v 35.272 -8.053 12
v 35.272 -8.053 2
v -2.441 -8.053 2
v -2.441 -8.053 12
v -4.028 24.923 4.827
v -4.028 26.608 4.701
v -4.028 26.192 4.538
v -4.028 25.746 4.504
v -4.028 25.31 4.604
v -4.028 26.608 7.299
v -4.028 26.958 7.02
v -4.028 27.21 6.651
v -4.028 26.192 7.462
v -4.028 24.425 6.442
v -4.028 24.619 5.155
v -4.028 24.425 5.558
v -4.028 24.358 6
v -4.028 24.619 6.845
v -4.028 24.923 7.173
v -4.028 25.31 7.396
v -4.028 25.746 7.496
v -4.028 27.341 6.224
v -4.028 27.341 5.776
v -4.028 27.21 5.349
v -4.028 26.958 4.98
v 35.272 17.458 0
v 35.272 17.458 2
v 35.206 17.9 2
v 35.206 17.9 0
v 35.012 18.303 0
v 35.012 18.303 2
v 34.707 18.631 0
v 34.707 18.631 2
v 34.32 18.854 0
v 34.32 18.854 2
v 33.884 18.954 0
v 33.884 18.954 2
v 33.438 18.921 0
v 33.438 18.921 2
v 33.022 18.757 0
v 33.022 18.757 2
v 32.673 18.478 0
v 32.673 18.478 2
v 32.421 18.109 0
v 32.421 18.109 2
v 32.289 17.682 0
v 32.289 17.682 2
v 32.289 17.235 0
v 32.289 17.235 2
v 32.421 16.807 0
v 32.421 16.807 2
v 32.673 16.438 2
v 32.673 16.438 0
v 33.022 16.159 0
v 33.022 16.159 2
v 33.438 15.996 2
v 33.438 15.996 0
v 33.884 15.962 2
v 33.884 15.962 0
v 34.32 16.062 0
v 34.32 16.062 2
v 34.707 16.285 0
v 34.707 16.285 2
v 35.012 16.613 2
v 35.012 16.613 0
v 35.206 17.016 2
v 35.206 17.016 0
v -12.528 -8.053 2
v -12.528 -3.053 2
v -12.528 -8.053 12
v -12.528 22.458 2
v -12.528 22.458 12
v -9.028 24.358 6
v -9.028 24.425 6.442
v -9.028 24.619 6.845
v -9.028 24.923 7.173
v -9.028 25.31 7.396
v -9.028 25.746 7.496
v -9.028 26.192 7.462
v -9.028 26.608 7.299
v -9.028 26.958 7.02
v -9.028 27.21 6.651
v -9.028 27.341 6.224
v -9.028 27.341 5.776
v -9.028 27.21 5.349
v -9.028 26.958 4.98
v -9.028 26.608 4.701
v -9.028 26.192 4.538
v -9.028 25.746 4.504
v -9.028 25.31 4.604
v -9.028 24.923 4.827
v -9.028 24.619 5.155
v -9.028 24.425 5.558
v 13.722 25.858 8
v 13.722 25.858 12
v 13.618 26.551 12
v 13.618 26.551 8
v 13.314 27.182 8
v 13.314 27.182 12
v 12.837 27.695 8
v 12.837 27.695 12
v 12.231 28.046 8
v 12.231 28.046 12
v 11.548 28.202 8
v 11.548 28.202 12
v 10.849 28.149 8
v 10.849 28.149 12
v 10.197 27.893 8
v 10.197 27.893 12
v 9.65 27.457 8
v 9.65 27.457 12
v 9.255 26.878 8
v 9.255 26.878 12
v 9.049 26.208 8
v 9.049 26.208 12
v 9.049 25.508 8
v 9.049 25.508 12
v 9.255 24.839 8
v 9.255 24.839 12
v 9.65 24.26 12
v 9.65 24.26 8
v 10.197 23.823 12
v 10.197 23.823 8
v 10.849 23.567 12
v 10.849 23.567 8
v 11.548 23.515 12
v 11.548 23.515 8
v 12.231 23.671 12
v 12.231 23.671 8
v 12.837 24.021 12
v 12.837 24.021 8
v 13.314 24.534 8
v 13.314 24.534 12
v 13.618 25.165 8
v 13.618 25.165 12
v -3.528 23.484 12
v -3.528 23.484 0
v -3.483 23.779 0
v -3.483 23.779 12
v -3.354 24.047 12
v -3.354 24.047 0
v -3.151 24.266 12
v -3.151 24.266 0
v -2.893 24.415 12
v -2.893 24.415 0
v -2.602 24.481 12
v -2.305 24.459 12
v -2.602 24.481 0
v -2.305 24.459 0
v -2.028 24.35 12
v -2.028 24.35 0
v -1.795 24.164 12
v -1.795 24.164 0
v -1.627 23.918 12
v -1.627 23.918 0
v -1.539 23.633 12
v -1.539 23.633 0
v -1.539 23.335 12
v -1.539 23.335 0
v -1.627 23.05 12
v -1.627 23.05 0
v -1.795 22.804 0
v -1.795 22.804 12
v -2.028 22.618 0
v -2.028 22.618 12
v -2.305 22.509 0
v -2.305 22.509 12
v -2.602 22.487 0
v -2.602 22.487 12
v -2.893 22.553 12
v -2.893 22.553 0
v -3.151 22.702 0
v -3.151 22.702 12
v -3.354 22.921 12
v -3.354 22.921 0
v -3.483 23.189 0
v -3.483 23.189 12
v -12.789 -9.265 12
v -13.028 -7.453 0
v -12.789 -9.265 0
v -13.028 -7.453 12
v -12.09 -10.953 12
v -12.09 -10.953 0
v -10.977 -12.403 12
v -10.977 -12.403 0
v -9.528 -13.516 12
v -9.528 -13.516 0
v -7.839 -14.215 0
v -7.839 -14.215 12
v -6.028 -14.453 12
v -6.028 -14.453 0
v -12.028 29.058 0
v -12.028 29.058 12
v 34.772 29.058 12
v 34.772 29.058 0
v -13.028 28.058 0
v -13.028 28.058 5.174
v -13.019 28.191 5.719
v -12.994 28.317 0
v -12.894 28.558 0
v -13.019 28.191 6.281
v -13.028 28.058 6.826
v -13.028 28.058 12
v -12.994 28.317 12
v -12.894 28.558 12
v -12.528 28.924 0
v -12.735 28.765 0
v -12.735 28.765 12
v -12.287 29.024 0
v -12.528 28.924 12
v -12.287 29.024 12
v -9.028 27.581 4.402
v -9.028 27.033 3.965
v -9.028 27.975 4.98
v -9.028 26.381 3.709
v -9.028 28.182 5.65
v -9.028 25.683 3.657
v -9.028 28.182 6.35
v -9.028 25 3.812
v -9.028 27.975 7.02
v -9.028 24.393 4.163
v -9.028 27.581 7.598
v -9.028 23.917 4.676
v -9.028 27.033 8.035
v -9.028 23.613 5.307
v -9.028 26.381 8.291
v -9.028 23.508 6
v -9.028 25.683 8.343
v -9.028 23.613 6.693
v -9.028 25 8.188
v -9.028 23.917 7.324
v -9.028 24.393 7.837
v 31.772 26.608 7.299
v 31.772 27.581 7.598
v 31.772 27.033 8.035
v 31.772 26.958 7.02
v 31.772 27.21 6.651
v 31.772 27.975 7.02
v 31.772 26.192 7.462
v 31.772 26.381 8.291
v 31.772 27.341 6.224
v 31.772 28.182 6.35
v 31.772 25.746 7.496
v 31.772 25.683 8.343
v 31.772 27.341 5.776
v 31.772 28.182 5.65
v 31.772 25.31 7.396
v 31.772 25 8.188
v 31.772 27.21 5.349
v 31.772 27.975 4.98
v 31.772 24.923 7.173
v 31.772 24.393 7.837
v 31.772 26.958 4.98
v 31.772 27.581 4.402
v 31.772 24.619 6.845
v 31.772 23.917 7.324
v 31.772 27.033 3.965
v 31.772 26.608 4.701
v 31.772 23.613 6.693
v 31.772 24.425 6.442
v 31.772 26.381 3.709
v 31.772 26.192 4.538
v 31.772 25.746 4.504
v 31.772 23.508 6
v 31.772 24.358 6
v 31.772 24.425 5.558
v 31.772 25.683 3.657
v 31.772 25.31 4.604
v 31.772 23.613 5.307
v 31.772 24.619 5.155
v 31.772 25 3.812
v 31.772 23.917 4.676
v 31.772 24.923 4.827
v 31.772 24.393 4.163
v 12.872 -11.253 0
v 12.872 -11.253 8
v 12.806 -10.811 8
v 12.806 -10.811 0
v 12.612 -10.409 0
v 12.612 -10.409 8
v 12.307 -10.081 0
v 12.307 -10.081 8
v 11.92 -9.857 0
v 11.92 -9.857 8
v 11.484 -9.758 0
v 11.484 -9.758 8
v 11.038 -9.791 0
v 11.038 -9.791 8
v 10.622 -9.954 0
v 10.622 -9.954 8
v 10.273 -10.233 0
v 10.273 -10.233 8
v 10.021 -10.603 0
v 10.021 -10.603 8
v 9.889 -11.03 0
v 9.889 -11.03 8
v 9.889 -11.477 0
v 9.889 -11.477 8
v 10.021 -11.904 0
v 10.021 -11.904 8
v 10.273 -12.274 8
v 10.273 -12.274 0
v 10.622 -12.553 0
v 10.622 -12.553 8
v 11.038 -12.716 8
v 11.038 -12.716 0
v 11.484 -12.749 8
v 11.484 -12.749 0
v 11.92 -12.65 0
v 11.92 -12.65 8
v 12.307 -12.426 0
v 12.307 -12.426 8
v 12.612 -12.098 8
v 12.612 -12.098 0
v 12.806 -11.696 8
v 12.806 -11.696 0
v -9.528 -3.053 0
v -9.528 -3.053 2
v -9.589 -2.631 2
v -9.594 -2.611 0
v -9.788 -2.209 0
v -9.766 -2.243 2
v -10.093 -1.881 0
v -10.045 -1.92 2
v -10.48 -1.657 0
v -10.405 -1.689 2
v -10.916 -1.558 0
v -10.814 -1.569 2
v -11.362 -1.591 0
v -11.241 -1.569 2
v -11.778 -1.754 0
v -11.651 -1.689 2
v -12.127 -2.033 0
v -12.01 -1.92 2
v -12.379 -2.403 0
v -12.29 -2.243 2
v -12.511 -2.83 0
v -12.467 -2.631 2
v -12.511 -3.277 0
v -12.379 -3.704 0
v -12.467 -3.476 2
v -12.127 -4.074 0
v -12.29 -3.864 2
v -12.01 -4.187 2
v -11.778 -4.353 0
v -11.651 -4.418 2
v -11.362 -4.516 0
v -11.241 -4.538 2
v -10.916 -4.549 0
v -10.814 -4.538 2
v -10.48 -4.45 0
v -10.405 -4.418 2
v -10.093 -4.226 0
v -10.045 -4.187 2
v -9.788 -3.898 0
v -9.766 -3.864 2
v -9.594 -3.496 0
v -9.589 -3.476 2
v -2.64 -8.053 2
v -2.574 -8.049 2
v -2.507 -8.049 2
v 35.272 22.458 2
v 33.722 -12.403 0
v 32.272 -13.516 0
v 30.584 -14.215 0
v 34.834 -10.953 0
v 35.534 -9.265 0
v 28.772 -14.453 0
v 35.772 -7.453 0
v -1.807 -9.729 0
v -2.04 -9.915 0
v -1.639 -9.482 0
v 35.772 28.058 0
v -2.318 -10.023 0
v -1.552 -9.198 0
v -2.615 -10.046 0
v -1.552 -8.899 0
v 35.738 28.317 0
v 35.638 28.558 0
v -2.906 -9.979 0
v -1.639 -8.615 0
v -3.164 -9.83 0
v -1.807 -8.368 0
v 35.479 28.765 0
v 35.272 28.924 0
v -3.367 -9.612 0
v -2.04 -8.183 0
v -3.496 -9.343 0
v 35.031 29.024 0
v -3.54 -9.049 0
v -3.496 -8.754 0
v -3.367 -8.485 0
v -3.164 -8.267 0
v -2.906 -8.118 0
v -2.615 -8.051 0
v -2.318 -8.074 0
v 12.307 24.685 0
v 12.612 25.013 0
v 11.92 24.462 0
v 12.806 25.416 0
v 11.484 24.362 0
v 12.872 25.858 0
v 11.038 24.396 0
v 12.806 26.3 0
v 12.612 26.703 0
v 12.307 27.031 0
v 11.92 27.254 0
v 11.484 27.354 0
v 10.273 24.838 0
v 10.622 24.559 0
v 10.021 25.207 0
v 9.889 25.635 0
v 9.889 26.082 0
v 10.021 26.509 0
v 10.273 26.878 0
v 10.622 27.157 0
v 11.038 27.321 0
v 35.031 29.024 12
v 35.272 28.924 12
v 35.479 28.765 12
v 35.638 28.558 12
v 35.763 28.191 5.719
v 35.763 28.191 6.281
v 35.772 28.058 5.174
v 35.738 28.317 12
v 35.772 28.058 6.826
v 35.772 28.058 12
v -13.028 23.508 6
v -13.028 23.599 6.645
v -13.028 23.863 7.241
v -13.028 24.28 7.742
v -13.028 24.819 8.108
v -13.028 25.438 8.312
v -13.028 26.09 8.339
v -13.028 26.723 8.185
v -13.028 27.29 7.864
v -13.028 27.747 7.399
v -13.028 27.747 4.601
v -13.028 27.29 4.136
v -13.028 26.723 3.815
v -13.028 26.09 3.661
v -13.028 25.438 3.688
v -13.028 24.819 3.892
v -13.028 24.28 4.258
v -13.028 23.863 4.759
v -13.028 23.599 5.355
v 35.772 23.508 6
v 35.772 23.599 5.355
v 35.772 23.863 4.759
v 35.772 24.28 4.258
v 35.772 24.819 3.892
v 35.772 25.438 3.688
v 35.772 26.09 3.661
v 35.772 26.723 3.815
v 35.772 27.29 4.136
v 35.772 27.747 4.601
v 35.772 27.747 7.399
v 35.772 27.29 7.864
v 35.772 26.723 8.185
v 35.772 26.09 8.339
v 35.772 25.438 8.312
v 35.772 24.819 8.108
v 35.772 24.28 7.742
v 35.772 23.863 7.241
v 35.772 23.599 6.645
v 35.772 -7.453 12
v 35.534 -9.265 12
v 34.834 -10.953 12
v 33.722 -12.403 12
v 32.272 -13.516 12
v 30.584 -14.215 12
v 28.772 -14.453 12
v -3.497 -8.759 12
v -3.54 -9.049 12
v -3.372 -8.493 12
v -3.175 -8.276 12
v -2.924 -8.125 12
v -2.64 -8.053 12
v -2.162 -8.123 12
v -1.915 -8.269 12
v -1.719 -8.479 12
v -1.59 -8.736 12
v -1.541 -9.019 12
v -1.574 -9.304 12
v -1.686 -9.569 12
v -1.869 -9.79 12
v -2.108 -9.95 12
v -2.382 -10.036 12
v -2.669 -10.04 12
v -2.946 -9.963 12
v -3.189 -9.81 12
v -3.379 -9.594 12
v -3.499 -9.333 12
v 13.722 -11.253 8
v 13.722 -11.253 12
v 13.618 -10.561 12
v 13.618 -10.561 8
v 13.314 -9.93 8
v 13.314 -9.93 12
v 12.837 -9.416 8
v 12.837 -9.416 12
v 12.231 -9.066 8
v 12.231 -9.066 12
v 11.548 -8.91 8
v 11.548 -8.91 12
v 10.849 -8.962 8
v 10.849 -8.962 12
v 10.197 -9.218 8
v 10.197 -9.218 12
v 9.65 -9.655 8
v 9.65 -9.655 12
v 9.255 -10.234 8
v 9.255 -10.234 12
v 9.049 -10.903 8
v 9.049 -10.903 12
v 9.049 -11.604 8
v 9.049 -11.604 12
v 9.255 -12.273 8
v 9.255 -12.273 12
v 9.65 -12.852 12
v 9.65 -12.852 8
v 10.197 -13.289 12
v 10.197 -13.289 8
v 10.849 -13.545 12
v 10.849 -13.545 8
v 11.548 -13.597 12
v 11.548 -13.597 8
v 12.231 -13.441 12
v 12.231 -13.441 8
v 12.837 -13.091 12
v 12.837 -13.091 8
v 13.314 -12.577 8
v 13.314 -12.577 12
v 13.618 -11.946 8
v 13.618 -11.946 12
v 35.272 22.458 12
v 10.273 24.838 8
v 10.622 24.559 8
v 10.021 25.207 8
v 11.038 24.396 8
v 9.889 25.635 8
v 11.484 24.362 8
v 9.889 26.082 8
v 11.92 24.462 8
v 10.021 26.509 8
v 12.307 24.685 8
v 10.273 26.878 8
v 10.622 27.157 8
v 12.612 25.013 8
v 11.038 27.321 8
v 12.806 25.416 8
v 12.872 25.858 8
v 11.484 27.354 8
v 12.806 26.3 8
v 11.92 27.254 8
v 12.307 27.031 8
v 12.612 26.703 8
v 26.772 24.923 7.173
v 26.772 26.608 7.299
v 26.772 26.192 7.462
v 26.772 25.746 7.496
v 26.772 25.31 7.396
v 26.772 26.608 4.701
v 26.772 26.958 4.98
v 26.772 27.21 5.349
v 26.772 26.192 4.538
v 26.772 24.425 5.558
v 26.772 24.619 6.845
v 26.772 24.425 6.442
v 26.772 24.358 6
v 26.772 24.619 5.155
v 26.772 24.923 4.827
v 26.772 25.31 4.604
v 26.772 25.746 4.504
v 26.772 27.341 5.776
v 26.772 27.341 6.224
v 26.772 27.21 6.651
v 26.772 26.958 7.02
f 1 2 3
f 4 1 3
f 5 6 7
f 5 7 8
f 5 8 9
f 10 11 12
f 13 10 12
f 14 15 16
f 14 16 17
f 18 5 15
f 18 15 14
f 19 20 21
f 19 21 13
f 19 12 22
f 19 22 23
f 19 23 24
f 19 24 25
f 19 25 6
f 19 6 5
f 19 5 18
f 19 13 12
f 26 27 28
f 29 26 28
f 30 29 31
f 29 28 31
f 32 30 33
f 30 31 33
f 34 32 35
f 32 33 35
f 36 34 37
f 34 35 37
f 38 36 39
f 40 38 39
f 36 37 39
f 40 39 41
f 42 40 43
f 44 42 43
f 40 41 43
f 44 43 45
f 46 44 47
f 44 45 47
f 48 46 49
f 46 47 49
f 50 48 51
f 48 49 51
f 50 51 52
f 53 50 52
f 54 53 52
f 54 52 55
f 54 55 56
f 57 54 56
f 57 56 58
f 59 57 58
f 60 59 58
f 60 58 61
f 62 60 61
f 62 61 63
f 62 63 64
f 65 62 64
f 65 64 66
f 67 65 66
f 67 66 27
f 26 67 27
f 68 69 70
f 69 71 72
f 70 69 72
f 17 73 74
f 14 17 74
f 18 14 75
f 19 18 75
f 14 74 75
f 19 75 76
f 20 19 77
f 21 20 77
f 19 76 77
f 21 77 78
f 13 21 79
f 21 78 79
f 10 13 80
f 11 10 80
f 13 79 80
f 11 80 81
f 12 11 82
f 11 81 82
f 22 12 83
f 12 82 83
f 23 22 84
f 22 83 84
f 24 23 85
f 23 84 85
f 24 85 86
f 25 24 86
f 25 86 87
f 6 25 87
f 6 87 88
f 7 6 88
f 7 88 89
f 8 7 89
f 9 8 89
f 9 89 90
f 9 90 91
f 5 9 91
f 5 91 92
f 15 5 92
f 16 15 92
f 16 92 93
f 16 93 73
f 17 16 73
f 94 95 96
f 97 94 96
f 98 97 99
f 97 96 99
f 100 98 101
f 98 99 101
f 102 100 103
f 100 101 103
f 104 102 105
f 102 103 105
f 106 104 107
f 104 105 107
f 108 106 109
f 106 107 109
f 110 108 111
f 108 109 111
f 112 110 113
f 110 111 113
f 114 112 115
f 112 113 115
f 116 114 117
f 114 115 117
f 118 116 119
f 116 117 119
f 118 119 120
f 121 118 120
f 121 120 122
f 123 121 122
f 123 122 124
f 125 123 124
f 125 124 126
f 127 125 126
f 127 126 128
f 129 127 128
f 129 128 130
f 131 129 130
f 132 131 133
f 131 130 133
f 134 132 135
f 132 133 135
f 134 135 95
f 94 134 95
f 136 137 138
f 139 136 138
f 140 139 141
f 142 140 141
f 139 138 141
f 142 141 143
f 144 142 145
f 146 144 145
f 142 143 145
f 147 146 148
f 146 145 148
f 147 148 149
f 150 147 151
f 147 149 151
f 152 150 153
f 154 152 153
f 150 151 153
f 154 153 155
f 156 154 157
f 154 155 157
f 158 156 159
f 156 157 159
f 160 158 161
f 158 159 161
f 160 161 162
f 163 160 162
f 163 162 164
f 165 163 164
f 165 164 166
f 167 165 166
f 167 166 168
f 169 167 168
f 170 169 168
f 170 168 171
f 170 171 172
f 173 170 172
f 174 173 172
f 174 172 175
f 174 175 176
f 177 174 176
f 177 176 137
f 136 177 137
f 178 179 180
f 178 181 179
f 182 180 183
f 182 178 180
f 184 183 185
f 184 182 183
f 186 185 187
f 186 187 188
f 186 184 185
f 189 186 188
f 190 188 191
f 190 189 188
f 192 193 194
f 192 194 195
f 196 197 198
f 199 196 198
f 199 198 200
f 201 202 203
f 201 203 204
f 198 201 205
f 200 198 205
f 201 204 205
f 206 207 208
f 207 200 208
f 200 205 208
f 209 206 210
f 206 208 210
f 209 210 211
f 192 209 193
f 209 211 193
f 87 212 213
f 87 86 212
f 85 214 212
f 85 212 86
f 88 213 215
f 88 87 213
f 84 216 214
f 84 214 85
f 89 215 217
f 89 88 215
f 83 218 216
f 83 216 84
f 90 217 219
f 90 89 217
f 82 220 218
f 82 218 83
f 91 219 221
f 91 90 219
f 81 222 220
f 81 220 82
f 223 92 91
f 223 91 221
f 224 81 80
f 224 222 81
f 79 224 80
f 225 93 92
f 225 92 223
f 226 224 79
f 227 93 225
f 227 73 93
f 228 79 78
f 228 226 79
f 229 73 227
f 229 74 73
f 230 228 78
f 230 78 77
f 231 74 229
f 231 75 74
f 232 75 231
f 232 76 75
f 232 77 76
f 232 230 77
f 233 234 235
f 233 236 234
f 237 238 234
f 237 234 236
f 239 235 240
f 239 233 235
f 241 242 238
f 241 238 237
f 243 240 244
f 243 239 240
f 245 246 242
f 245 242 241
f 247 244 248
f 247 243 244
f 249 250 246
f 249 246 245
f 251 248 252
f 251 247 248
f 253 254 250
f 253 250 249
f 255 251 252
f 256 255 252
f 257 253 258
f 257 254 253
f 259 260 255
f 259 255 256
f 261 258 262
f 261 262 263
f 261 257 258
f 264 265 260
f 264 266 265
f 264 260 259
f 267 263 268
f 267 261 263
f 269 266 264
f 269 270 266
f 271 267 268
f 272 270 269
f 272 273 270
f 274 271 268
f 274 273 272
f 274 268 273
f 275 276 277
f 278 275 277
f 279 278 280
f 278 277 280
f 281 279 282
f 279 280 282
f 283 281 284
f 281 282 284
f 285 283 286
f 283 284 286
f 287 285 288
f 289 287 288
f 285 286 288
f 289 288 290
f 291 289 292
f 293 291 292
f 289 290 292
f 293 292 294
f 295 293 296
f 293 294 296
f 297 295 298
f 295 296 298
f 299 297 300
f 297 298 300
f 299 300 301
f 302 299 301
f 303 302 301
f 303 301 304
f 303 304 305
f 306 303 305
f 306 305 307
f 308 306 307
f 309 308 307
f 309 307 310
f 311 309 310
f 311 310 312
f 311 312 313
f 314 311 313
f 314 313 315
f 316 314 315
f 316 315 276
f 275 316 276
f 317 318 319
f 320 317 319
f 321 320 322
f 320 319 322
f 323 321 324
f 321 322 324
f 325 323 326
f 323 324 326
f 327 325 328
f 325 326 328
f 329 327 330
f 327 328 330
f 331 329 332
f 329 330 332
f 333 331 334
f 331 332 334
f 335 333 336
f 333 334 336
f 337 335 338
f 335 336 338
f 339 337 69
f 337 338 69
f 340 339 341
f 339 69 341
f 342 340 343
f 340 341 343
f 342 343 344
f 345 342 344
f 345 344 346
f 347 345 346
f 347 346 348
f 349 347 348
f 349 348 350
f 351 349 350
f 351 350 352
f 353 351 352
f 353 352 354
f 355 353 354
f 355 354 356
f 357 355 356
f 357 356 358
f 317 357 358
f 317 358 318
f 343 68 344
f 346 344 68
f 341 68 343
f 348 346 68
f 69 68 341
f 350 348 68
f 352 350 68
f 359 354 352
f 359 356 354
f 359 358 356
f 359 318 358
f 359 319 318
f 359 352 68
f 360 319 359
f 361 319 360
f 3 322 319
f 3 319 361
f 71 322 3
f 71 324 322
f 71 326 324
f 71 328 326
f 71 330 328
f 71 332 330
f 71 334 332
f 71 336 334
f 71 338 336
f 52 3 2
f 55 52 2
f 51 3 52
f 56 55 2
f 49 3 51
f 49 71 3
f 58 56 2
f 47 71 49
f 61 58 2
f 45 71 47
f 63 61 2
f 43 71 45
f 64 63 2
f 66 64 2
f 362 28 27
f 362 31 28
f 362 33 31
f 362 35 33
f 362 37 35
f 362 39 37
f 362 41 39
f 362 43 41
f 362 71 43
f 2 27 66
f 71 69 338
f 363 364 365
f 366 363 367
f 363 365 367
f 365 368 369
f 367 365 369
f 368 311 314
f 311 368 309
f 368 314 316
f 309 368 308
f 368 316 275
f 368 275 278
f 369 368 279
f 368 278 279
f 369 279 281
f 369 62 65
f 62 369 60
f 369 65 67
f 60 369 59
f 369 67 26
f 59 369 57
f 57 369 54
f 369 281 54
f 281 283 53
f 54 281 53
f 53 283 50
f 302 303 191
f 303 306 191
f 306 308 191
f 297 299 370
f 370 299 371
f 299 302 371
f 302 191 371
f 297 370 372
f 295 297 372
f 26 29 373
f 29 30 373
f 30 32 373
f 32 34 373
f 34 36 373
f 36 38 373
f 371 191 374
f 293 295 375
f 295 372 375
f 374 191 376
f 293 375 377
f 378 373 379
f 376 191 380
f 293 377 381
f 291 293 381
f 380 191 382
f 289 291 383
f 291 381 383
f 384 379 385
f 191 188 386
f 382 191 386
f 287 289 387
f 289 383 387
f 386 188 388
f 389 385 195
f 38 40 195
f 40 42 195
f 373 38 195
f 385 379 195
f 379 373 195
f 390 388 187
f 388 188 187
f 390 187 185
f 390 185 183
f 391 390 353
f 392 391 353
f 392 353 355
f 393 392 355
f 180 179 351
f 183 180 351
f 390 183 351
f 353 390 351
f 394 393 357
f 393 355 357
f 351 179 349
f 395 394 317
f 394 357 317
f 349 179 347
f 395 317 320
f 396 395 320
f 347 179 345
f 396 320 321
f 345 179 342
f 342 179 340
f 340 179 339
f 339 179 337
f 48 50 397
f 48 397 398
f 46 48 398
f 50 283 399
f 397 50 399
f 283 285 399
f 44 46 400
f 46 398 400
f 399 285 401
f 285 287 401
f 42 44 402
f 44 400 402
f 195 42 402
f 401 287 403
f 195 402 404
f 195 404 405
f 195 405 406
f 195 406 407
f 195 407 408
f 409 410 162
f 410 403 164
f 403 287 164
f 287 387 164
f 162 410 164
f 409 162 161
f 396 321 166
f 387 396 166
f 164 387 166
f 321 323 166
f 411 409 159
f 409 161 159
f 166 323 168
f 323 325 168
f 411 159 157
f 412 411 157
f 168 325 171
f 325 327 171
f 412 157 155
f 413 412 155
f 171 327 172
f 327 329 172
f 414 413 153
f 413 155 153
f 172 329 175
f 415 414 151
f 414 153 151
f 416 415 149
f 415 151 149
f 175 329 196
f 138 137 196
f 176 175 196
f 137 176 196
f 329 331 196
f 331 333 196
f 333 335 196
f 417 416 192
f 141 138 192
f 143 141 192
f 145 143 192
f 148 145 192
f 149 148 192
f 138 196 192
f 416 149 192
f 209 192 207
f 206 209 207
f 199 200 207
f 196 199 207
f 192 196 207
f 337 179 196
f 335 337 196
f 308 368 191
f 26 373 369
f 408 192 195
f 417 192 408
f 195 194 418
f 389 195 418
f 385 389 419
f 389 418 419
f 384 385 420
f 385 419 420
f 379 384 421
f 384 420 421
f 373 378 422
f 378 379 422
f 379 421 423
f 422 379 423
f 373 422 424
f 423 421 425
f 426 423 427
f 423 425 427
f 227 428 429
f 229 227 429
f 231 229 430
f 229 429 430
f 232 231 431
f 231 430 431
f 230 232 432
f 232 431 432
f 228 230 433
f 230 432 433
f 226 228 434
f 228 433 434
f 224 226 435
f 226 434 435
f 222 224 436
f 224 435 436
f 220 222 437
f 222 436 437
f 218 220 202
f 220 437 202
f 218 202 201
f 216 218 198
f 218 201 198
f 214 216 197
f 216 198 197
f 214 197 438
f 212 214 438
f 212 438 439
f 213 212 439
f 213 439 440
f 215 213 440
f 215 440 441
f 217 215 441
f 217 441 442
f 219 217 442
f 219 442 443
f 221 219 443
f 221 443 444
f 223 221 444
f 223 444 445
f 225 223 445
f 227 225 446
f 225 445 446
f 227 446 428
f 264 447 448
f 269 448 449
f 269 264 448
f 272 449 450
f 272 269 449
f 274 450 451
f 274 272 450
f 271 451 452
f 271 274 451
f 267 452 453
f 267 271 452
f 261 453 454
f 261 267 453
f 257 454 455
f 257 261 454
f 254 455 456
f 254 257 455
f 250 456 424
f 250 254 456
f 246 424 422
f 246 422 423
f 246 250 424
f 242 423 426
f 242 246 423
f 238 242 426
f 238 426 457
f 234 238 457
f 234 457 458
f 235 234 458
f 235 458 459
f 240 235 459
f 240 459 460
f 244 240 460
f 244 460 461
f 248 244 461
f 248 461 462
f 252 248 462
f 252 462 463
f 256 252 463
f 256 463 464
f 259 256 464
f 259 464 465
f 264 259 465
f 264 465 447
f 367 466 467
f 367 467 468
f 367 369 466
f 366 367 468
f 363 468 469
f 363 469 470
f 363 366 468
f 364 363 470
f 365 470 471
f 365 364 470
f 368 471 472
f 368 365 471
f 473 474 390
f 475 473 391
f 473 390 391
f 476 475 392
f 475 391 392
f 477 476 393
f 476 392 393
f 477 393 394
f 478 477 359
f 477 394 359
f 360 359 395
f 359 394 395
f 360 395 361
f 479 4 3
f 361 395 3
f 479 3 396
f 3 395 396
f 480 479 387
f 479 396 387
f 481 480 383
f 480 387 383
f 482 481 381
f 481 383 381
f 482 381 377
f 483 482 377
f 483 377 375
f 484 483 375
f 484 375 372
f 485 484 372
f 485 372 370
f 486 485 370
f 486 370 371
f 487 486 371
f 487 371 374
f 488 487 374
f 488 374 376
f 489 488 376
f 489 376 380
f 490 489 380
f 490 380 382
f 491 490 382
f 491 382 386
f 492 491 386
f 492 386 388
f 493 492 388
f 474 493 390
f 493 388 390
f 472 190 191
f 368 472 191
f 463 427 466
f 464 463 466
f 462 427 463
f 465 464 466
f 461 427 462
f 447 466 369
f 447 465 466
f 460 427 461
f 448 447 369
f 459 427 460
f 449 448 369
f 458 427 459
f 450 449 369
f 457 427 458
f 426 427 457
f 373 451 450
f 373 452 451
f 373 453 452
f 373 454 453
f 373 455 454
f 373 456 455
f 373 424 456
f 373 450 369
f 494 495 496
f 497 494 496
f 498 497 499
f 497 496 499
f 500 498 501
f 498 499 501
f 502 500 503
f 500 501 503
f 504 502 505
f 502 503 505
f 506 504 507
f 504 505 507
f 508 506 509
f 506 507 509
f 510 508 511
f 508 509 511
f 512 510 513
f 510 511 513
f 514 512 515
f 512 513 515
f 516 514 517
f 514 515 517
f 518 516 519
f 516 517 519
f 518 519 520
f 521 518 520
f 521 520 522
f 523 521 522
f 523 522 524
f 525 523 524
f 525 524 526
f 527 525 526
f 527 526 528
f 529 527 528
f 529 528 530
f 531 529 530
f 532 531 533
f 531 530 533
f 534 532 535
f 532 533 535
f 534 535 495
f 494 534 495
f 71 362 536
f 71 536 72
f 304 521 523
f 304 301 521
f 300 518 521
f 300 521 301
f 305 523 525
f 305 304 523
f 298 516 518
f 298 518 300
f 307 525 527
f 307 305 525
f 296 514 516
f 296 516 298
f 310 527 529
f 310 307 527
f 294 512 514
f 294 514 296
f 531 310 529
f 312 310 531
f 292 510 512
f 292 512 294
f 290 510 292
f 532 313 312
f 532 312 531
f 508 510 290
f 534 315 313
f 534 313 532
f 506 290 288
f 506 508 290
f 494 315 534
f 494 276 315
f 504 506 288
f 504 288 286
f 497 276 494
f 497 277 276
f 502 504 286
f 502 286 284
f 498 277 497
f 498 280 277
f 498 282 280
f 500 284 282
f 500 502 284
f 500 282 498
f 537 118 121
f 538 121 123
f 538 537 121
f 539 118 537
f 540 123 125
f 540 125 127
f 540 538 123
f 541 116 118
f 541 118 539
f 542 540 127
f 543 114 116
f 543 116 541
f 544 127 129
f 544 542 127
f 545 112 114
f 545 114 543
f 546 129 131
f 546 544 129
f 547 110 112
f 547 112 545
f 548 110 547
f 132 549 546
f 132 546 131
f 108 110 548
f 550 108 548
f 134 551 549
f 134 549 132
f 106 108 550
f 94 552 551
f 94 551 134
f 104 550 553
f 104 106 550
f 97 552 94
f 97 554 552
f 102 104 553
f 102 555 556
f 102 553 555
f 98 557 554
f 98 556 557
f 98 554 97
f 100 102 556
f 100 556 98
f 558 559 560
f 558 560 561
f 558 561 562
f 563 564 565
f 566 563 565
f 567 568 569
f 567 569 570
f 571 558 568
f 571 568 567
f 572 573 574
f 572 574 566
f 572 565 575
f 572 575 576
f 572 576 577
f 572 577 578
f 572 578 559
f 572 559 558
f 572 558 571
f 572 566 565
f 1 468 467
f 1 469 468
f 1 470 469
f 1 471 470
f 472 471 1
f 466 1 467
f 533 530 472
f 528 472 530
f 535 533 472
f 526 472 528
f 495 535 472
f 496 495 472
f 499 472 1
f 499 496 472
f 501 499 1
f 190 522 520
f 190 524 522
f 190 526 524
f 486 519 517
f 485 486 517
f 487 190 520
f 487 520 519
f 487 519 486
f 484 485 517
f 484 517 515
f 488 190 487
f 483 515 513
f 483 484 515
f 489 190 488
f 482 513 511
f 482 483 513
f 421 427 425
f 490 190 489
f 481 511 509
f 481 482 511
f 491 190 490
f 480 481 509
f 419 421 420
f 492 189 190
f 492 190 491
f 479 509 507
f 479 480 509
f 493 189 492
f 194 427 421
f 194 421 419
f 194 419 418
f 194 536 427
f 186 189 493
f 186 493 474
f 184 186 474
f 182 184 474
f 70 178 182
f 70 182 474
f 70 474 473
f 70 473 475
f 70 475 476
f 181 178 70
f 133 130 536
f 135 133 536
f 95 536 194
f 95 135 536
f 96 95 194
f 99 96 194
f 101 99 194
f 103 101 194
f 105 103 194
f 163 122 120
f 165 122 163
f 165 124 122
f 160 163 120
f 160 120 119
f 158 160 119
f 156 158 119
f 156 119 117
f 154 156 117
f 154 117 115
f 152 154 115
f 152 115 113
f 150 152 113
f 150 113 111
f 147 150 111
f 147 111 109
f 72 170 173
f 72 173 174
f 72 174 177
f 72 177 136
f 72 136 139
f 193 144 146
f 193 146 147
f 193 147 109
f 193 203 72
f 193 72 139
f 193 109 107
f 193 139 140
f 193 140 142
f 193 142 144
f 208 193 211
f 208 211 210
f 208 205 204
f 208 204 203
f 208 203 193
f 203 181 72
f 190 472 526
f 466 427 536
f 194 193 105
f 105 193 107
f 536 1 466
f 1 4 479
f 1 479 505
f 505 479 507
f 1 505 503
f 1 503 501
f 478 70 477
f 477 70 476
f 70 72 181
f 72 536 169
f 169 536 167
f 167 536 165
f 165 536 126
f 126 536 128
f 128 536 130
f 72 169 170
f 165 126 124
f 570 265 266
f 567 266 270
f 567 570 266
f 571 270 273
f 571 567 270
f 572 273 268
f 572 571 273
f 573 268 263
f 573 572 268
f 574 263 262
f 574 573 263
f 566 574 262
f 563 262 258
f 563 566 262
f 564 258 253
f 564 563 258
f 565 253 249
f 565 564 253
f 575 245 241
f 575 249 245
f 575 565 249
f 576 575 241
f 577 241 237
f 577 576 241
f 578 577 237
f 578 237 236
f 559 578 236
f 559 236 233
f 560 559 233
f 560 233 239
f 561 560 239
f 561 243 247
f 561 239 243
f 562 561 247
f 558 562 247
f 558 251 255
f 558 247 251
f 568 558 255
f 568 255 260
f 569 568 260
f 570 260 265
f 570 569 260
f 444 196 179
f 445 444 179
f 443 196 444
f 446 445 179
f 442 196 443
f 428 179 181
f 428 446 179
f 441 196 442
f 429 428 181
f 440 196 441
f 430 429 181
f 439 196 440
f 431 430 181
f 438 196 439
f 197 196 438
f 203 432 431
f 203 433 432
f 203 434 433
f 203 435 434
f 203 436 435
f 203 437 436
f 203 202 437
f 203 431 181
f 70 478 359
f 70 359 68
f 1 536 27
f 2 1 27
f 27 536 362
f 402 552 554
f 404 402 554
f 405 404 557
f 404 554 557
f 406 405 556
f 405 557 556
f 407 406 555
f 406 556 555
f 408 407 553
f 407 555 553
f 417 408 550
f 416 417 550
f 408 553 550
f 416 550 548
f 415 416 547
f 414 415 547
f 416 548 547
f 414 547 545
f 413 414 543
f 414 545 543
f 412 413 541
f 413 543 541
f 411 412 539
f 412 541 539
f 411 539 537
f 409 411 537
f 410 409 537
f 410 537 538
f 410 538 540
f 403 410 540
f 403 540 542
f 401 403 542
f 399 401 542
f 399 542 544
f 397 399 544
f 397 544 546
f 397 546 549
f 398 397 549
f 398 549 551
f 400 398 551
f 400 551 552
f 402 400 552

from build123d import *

# Parameters (mm, degrees)
SKIZZE4_W                       = 47.8
SKIZZE4_H                       = 37.511655438
AUFSATZ_LINEAR_AUSTRAGEN2_DEPTH = 2
SKIZZE5_W                       = 47.8
SKIZZE5_H                       = 3.6
SKIZZE5_H_2                     = 3.4
AUFSATZ_LINEAR_AUSTRAGEN3_DEPTH = 12
SKIZZE6_R                       = 1
SCHNITT_LINEAR_AUSTRAGEN1_DEPTH = 19
SKIZZE8_W                       = 47.8
SKIZZE8_H                       = 12
AUFSATZ_LINEAR_AUSTRAGEN4_DEPTH = 3
SKIZZE9_W                       = 47.8
SKIZZE9_H                       = 12
AUFSATZ_LINEAR_AUSTRAGEN5_DEPTH = 3
SKIZZE10_W                      = 12
SKIZZE10_H                      = 43.511655438
AUFSATZ_LINEAR_AUSTRAGEN6_DEPTH = 0.5
SKIZZE11_W                      = 12
SKIZZE11_H                      = 43.511655438
AUFSATZ_LINEAR_AUSTRAGEN7_DEPTH = 0.5
SKIZZE12_R                      = 1.5
SCHNITT_LINEAR_AUSTRAGEN2_DEPTH = 9
SCHNITT_LINEAR_START            = -9
SKIZZE13_R                      = 1.5
SCHNITT_LINEAR_AUSTRAGEN3_DEPTH = 9
SKIZZE14_R                      = 2.35
SCHNITT_LINEAR_AUSTRAGEN4_DEPTH = 4
SCHNITT_LINEAR_START_2          = -4
SKIZZE15_R                      = 2.35
SCHNITT_LINEAR_AUSTRAGEN5_DEPTH = 4
VERRUNDUNG3_R                   = 1
VERRUNDUNG4_R                   = 1
VERRUNDUNG5_R                   = 7
SKIZZE17_R                      = 2.35
SCHNITT_LINEAR_AUSTRAGEN6_DEPTH = 4
SKIZZE18_R                      = 1.5
SCHNITT_LINEAR_AUSTRAGEN7_DEPTH = 14
SKIZZE19_R                      = 1.5
SCHNITT_LINEAR_AUSTRAGEN8_DEPTH = 14


with BuildPart() as part:
    # Skizze4 → Aufsatz-Linear austragen2 (new body)
    with BuildSketch(Plane.XY):
        with Locations((11.372253432, 7.302337754)):
            Rectangle(SKIZZE4_W, SKIZZE4_H)
    extrude(amount=AUFSATZ_LINEAR_AUSTRAGEN2_DEPTH)

    # Skizze5 → Aufsatz-Linear austragen3 (add)
    with BuildSketch(Plane(origin=(0, 0, 0), x_dir=(-1, 0, 0), z_dir=(0, 0, -1))):
        with Locations((-11.372253432, 24.258165473)):
            Rectangle(SKIZZE5_W, SKIZZE5_H)
        with Locations((-11.372253432, -9.753489965)):
            Rectangle(SKIZZE5_W, SKIZZE5_H_2)
    extrude(amount=-AUFSATZ_LINEAR_AUSTRAGEN3_DEPTH)

    # Skizze6 → Schnitt-Linear austragen1 (cut)
    with BuildSketch(Plane(origin=(0, 0, 0), x_dir=(-1, 0, 0), z_dir=(0, 0, -1))):
        with Locations((2.527746568, 23.483879087)):
            Circle(SKIZZE6_R)
        with Locations((2.540359159, -9.04853229)):
            Circle(SKIZZE6_R)
    extrude(amount=-SCHNITT_LINEAR_AUSTRAGEN1_DEPTH, mode=Mode.SUBTRACT)

    # Skizze8 → Aufsatz-Linear austragen4 (add)
    with BuildSketch(Plane(origin=(0, 26.058165473, 0), x_dir=(1, 0, 0), z_dir=(0, 1, 0))):
        with Locations((11.372253432, -6)):
            Rectangle(SKIZZE8_W, SKIZZE8_H)
    extrude(amount=AUFSATZ_LINEAR_AUSTRAGEN4_DEPTH)

    # Skizze9 → Aufsatz-Linear austragen5 (add)
    with BuildSketch(Plane.XZ.offset(11.453489965)):
        with Locations((11.372253432, 6)):
            Rectangle(SKIZZE9_W, SKIZZE9_H)
    extrude(amount=AUFSATZ_LINEAR_AUSTRAGEN5_DEPTH)

    # Skizze10 → Aufsatz-Linear austragen6 (add)
    with BuildSketch(Plane.ZY.offset(12.527746568)):
        with Locations((6, 7.302337754)):
            Rectangle(SKIZZE10_W, SKIZZE10_H)
    extrude(amount=AUFSATZ_LINEAR_AUSTRAGEN6_DEPTH)

    # Skizze11 → Aufsatz-Linear austragen7 (add)
    with BuildSketch(Plane(origin=(35.272253432, 0, 0), x_dir=(0, 0, -1), z_dir=(1, 0, 0))):
        with Locations((-6, 7.302337754)):
            Rectangle(SKIZZE11_W, SKIZZE11_H)
    extrude(amount=AUFSATZ_LINEAR_AUSTRAGEN7_DEPTH)

    # Skizze12 → Schnitt-Linear austragen2 (cut)
    with BuildSketch(Plane.ZY.offset(13.027746568)):
        with Locations(Location((6, 25.858165473, 0), (0, 0, 270))):
            Circle(SKIZZE12_R)
    extrude(amount=-SCHNITT_LINEAR_AUSTRAGEN2_DEPTH, mode=Mode.SUBTRACT)

    # Skizze13 → Schnitt-Linear austragen3 (cut)
    with BuildSketch(Plane(origin=(35.772253432, 0, 0), x_dir=(0, 0, -1), z_dir=(1, 0, 0)).offset(SCHNITT_LINEAR_START)):
        with Locations(Location((-6, 25.858165473, 0), (0, 0, 270))):
            Circle(SKIZZE13_R)
    extrude(amount=SCHNITT_LINEAR_AUSTRAGEN3_DEPTH, mode=Mode.SUBTRACT)

    # Skizze14 → Schnitt-Linear austragen4 (cut)
    with BuildSketch(Plane.ZY.offset(13.027746568)):
        with Locations(Location((6, 25.858165473, 0), (0, 0, 270))):
            Circle(SKIZZE14_R)
    extrude(amount=-SCHNITT_LINEAR_AUSTRAGEN4_DEPTH, mode=Mode.SUBTRACT)

    # Skizze15 → Schnitt-Linear austragen5 (cut)
    with BuildSketch(Plane(origin=(35.772253432, 0, 0), x_dir=(0, 0, -1), z_dir=(1, 0, 0)).offset(SCHNITT_LINEAR_START_2)):
        with Locations(Location((-6, 25.858165473, 0), (0, 0, 270))):
            Circle(SKIZZE15_R)
    extrude(amount=SCHNITT_LINEAR_AUSTRAGEN5_DEPTH, mode=Mode.SUBTRACT)

    # Verrundung3
    # the kernel refuses this fillet: 1 mm, written as the material it takes off along each edge
    with BuildSketch(Plane(origin=(35.772253432, 29.058165473, 14.5), x_dir=(-1, 0, 0), z_dir=(0, 0, -1))) as verrundung3_piece_1:
        with BuildLine():
            CenterArc((VERRUNDUNG3_R, -VERRUNDUNG3_R), VERRUNDUNG3_R, 90, 90)
            Line((0, -VERRUNDUNG3_R), (0, 0))
            Line((0, 0), (VERRUNDUNG3_R, 0))
        make_face()
    extrude(amount=17, mode=Mode.SUBTRACT)

    # Verrundung4
    # the kernel refuses this fillet: 1 mm, written as the material it takes off along each edge
    with BuildSketch(Plane(origin=(-13.027746568, 29.058165473, 14.5), x_dir=(1, 0, 0), z_dir=(0, 0, -1))) as verrundung4_piece_1:
        with BuildLine():
            CenterArc((VERRUNDUNG4_R, VERRUNDUNG4_R), VERRUNDUNG4_R, 180, 90)
            Line((0, VERRUNDUNG4_R), (0, 0))
            Line((0, 0), (VERRUNDUNG4_R, 0))
        make_face()
    extrude(amount=17, mode=Mode.SUBTRACT)

    # Verrundung5
    verrundung5_edges = [part.edges().sort_by_distance(p)[0] for p in [
        (35.772253432, -14.453489965, 6),
        (-13.027746568, -14.453489965, 6),
    ]]
    fillet(verrundung5_edges, radius=VERRUNDUNG5_R)

    # Skizze17 → Schnitt-Linear austragen6 (cut)
    with BuildSketch(Plane.XY.offset(12)):
        with Locations((11.372253432, -11.253489965)):
            Circle(SKIZZE17_R)
        with Locations((11.372253432, 25.858165473)):
            Circle(SKIZZE17_R)
    extrude(amount=-SCHNITT_LINEAR_AUSTRAGEN6_DEPTH, mode=Mode.SUBTRACT)

    # Skizze18 → Schnitt-Linear austragen7 (cut)
    with BuildSketch(Plane.XY.offset(8)):
        with Locations((11.372253432, -11.253489965)):
            Circle(SKIZZE18_R)
        with Locations((11.372253432, 25.858165473)):
            Circle(SKIZZE18_R)
    extrude(amount=-SCHNITT_LINEAR_AUSTRAGEN7_DEPTH, mode=Mode.SUBTRACT)

    # Skizze19 → Schnitt-Linear austragen8 (cut)
    with BuildSketch(Plane.XY.offset(2)):
        with Locations((-11.027746568, -3.053489965)):
            Circle(SKIZZE19_R)
        with Locations((33.772253432, 17.458165473)):
            Circle(SKIZZE19_R)
    extrude(amount=-SCHNITT_LINEAR_AUSTRAGEN8_DEPTH, mode=Mode.SUBTRACT)


solid = part.part
